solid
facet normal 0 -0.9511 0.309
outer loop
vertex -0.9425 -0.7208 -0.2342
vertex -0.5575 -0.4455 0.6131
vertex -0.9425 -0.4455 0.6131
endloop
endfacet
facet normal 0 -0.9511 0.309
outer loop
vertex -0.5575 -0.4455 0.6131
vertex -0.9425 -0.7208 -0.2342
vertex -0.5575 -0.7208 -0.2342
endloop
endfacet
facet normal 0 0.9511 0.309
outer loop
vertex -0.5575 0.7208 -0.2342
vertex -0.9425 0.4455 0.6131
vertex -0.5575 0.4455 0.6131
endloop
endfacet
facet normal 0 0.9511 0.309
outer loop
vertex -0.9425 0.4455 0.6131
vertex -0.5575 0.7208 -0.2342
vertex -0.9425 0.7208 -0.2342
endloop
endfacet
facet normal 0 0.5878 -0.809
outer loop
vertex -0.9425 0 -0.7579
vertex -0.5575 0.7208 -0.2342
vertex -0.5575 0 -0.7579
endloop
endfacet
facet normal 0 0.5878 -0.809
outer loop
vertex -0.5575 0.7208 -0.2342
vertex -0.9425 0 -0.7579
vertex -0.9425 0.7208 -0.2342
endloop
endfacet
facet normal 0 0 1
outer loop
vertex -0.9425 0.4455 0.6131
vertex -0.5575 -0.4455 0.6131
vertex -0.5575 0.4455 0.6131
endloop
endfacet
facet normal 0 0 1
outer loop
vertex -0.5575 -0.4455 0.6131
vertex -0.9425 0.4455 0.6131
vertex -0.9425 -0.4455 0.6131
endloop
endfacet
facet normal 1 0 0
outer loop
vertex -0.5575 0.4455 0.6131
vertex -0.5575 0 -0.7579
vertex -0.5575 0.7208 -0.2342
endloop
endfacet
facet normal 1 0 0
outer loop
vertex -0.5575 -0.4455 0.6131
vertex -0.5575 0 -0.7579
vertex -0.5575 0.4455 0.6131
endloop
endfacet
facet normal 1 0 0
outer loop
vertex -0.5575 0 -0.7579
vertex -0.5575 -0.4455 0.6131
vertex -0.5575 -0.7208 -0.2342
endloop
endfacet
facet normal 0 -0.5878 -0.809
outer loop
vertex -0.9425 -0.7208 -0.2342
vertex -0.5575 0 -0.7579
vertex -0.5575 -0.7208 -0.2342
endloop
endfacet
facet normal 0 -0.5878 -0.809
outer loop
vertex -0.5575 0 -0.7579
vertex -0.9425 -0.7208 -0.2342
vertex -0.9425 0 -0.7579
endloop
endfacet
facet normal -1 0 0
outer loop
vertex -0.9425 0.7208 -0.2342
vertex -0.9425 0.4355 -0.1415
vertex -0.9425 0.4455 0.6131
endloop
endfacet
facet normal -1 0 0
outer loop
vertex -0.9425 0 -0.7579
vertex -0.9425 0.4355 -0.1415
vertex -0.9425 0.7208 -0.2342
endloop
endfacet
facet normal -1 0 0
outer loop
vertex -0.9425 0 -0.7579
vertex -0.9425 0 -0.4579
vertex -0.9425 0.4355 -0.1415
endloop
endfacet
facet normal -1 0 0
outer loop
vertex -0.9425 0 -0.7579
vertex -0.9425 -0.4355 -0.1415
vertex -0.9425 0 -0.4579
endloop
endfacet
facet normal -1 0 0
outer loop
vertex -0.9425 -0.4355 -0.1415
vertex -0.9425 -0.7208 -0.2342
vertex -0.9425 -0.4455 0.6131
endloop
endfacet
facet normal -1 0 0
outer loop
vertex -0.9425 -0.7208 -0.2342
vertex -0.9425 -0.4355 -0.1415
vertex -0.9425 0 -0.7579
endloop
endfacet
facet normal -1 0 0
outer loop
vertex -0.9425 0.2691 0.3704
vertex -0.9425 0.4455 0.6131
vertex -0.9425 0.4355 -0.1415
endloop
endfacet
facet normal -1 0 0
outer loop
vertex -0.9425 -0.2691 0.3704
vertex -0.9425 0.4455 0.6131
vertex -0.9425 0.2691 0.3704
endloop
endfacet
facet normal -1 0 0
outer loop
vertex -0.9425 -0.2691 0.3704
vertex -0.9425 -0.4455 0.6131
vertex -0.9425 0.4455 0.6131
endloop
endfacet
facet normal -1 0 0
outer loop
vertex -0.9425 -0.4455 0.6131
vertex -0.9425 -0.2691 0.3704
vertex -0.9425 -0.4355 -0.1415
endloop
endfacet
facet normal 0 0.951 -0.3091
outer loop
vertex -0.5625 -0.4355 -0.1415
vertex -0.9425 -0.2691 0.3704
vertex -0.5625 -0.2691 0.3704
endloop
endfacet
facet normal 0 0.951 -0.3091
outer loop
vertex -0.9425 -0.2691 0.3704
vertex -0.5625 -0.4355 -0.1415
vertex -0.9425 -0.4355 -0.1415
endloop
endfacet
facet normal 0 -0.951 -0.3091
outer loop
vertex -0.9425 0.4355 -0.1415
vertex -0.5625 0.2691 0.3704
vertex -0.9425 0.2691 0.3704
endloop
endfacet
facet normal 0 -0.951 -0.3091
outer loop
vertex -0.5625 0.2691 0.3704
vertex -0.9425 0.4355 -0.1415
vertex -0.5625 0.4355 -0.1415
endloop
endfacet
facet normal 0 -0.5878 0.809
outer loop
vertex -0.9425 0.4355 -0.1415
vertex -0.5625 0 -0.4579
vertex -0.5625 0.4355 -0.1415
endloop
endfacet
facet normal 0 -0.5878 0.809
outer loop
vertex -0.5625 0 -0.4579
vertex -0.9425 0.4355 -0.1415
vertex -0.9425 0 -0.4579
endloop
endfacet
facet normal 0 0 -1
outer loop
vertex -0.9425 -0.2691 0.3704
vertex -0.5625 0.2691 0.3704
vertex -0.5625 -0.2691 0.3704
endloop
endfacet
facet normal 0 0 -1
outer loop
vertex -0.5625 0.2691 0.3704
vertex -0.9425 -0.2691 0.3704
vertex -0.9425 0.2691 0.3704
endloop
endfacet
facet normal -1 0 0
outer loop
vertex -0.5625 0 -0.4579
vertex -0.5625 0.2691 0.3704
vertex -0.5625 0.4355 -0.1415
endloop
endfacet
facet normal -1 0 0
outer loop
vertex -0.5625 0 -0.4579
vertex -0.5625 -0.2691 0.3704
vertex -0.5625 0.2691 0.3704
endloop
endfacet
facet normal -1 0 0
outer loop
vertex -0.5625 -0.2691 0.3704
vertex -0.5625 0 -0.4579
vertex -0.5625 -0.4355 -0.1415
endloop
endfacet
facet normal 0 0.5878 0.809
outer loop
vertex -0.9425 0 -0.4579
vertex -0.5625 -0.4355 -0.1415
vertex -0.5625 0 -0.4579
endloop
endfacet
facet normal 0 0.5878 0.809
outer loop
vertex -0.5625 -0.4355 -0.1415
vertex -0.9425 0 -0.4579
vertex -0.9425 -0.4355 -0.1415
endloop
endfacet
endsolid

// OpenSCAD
EPS = 0.01;

translate([-0.75, 0, 0])
rotate([0, 90, 0])
difference() {
    cylinder(h=0.375 + EPS, r=0.7578947368421053, center=true);
    translate([0, 0, -EPS])
    cylinder(h=0.375 + 2*EPS, r=0.4578947368421053, center=true);
}
